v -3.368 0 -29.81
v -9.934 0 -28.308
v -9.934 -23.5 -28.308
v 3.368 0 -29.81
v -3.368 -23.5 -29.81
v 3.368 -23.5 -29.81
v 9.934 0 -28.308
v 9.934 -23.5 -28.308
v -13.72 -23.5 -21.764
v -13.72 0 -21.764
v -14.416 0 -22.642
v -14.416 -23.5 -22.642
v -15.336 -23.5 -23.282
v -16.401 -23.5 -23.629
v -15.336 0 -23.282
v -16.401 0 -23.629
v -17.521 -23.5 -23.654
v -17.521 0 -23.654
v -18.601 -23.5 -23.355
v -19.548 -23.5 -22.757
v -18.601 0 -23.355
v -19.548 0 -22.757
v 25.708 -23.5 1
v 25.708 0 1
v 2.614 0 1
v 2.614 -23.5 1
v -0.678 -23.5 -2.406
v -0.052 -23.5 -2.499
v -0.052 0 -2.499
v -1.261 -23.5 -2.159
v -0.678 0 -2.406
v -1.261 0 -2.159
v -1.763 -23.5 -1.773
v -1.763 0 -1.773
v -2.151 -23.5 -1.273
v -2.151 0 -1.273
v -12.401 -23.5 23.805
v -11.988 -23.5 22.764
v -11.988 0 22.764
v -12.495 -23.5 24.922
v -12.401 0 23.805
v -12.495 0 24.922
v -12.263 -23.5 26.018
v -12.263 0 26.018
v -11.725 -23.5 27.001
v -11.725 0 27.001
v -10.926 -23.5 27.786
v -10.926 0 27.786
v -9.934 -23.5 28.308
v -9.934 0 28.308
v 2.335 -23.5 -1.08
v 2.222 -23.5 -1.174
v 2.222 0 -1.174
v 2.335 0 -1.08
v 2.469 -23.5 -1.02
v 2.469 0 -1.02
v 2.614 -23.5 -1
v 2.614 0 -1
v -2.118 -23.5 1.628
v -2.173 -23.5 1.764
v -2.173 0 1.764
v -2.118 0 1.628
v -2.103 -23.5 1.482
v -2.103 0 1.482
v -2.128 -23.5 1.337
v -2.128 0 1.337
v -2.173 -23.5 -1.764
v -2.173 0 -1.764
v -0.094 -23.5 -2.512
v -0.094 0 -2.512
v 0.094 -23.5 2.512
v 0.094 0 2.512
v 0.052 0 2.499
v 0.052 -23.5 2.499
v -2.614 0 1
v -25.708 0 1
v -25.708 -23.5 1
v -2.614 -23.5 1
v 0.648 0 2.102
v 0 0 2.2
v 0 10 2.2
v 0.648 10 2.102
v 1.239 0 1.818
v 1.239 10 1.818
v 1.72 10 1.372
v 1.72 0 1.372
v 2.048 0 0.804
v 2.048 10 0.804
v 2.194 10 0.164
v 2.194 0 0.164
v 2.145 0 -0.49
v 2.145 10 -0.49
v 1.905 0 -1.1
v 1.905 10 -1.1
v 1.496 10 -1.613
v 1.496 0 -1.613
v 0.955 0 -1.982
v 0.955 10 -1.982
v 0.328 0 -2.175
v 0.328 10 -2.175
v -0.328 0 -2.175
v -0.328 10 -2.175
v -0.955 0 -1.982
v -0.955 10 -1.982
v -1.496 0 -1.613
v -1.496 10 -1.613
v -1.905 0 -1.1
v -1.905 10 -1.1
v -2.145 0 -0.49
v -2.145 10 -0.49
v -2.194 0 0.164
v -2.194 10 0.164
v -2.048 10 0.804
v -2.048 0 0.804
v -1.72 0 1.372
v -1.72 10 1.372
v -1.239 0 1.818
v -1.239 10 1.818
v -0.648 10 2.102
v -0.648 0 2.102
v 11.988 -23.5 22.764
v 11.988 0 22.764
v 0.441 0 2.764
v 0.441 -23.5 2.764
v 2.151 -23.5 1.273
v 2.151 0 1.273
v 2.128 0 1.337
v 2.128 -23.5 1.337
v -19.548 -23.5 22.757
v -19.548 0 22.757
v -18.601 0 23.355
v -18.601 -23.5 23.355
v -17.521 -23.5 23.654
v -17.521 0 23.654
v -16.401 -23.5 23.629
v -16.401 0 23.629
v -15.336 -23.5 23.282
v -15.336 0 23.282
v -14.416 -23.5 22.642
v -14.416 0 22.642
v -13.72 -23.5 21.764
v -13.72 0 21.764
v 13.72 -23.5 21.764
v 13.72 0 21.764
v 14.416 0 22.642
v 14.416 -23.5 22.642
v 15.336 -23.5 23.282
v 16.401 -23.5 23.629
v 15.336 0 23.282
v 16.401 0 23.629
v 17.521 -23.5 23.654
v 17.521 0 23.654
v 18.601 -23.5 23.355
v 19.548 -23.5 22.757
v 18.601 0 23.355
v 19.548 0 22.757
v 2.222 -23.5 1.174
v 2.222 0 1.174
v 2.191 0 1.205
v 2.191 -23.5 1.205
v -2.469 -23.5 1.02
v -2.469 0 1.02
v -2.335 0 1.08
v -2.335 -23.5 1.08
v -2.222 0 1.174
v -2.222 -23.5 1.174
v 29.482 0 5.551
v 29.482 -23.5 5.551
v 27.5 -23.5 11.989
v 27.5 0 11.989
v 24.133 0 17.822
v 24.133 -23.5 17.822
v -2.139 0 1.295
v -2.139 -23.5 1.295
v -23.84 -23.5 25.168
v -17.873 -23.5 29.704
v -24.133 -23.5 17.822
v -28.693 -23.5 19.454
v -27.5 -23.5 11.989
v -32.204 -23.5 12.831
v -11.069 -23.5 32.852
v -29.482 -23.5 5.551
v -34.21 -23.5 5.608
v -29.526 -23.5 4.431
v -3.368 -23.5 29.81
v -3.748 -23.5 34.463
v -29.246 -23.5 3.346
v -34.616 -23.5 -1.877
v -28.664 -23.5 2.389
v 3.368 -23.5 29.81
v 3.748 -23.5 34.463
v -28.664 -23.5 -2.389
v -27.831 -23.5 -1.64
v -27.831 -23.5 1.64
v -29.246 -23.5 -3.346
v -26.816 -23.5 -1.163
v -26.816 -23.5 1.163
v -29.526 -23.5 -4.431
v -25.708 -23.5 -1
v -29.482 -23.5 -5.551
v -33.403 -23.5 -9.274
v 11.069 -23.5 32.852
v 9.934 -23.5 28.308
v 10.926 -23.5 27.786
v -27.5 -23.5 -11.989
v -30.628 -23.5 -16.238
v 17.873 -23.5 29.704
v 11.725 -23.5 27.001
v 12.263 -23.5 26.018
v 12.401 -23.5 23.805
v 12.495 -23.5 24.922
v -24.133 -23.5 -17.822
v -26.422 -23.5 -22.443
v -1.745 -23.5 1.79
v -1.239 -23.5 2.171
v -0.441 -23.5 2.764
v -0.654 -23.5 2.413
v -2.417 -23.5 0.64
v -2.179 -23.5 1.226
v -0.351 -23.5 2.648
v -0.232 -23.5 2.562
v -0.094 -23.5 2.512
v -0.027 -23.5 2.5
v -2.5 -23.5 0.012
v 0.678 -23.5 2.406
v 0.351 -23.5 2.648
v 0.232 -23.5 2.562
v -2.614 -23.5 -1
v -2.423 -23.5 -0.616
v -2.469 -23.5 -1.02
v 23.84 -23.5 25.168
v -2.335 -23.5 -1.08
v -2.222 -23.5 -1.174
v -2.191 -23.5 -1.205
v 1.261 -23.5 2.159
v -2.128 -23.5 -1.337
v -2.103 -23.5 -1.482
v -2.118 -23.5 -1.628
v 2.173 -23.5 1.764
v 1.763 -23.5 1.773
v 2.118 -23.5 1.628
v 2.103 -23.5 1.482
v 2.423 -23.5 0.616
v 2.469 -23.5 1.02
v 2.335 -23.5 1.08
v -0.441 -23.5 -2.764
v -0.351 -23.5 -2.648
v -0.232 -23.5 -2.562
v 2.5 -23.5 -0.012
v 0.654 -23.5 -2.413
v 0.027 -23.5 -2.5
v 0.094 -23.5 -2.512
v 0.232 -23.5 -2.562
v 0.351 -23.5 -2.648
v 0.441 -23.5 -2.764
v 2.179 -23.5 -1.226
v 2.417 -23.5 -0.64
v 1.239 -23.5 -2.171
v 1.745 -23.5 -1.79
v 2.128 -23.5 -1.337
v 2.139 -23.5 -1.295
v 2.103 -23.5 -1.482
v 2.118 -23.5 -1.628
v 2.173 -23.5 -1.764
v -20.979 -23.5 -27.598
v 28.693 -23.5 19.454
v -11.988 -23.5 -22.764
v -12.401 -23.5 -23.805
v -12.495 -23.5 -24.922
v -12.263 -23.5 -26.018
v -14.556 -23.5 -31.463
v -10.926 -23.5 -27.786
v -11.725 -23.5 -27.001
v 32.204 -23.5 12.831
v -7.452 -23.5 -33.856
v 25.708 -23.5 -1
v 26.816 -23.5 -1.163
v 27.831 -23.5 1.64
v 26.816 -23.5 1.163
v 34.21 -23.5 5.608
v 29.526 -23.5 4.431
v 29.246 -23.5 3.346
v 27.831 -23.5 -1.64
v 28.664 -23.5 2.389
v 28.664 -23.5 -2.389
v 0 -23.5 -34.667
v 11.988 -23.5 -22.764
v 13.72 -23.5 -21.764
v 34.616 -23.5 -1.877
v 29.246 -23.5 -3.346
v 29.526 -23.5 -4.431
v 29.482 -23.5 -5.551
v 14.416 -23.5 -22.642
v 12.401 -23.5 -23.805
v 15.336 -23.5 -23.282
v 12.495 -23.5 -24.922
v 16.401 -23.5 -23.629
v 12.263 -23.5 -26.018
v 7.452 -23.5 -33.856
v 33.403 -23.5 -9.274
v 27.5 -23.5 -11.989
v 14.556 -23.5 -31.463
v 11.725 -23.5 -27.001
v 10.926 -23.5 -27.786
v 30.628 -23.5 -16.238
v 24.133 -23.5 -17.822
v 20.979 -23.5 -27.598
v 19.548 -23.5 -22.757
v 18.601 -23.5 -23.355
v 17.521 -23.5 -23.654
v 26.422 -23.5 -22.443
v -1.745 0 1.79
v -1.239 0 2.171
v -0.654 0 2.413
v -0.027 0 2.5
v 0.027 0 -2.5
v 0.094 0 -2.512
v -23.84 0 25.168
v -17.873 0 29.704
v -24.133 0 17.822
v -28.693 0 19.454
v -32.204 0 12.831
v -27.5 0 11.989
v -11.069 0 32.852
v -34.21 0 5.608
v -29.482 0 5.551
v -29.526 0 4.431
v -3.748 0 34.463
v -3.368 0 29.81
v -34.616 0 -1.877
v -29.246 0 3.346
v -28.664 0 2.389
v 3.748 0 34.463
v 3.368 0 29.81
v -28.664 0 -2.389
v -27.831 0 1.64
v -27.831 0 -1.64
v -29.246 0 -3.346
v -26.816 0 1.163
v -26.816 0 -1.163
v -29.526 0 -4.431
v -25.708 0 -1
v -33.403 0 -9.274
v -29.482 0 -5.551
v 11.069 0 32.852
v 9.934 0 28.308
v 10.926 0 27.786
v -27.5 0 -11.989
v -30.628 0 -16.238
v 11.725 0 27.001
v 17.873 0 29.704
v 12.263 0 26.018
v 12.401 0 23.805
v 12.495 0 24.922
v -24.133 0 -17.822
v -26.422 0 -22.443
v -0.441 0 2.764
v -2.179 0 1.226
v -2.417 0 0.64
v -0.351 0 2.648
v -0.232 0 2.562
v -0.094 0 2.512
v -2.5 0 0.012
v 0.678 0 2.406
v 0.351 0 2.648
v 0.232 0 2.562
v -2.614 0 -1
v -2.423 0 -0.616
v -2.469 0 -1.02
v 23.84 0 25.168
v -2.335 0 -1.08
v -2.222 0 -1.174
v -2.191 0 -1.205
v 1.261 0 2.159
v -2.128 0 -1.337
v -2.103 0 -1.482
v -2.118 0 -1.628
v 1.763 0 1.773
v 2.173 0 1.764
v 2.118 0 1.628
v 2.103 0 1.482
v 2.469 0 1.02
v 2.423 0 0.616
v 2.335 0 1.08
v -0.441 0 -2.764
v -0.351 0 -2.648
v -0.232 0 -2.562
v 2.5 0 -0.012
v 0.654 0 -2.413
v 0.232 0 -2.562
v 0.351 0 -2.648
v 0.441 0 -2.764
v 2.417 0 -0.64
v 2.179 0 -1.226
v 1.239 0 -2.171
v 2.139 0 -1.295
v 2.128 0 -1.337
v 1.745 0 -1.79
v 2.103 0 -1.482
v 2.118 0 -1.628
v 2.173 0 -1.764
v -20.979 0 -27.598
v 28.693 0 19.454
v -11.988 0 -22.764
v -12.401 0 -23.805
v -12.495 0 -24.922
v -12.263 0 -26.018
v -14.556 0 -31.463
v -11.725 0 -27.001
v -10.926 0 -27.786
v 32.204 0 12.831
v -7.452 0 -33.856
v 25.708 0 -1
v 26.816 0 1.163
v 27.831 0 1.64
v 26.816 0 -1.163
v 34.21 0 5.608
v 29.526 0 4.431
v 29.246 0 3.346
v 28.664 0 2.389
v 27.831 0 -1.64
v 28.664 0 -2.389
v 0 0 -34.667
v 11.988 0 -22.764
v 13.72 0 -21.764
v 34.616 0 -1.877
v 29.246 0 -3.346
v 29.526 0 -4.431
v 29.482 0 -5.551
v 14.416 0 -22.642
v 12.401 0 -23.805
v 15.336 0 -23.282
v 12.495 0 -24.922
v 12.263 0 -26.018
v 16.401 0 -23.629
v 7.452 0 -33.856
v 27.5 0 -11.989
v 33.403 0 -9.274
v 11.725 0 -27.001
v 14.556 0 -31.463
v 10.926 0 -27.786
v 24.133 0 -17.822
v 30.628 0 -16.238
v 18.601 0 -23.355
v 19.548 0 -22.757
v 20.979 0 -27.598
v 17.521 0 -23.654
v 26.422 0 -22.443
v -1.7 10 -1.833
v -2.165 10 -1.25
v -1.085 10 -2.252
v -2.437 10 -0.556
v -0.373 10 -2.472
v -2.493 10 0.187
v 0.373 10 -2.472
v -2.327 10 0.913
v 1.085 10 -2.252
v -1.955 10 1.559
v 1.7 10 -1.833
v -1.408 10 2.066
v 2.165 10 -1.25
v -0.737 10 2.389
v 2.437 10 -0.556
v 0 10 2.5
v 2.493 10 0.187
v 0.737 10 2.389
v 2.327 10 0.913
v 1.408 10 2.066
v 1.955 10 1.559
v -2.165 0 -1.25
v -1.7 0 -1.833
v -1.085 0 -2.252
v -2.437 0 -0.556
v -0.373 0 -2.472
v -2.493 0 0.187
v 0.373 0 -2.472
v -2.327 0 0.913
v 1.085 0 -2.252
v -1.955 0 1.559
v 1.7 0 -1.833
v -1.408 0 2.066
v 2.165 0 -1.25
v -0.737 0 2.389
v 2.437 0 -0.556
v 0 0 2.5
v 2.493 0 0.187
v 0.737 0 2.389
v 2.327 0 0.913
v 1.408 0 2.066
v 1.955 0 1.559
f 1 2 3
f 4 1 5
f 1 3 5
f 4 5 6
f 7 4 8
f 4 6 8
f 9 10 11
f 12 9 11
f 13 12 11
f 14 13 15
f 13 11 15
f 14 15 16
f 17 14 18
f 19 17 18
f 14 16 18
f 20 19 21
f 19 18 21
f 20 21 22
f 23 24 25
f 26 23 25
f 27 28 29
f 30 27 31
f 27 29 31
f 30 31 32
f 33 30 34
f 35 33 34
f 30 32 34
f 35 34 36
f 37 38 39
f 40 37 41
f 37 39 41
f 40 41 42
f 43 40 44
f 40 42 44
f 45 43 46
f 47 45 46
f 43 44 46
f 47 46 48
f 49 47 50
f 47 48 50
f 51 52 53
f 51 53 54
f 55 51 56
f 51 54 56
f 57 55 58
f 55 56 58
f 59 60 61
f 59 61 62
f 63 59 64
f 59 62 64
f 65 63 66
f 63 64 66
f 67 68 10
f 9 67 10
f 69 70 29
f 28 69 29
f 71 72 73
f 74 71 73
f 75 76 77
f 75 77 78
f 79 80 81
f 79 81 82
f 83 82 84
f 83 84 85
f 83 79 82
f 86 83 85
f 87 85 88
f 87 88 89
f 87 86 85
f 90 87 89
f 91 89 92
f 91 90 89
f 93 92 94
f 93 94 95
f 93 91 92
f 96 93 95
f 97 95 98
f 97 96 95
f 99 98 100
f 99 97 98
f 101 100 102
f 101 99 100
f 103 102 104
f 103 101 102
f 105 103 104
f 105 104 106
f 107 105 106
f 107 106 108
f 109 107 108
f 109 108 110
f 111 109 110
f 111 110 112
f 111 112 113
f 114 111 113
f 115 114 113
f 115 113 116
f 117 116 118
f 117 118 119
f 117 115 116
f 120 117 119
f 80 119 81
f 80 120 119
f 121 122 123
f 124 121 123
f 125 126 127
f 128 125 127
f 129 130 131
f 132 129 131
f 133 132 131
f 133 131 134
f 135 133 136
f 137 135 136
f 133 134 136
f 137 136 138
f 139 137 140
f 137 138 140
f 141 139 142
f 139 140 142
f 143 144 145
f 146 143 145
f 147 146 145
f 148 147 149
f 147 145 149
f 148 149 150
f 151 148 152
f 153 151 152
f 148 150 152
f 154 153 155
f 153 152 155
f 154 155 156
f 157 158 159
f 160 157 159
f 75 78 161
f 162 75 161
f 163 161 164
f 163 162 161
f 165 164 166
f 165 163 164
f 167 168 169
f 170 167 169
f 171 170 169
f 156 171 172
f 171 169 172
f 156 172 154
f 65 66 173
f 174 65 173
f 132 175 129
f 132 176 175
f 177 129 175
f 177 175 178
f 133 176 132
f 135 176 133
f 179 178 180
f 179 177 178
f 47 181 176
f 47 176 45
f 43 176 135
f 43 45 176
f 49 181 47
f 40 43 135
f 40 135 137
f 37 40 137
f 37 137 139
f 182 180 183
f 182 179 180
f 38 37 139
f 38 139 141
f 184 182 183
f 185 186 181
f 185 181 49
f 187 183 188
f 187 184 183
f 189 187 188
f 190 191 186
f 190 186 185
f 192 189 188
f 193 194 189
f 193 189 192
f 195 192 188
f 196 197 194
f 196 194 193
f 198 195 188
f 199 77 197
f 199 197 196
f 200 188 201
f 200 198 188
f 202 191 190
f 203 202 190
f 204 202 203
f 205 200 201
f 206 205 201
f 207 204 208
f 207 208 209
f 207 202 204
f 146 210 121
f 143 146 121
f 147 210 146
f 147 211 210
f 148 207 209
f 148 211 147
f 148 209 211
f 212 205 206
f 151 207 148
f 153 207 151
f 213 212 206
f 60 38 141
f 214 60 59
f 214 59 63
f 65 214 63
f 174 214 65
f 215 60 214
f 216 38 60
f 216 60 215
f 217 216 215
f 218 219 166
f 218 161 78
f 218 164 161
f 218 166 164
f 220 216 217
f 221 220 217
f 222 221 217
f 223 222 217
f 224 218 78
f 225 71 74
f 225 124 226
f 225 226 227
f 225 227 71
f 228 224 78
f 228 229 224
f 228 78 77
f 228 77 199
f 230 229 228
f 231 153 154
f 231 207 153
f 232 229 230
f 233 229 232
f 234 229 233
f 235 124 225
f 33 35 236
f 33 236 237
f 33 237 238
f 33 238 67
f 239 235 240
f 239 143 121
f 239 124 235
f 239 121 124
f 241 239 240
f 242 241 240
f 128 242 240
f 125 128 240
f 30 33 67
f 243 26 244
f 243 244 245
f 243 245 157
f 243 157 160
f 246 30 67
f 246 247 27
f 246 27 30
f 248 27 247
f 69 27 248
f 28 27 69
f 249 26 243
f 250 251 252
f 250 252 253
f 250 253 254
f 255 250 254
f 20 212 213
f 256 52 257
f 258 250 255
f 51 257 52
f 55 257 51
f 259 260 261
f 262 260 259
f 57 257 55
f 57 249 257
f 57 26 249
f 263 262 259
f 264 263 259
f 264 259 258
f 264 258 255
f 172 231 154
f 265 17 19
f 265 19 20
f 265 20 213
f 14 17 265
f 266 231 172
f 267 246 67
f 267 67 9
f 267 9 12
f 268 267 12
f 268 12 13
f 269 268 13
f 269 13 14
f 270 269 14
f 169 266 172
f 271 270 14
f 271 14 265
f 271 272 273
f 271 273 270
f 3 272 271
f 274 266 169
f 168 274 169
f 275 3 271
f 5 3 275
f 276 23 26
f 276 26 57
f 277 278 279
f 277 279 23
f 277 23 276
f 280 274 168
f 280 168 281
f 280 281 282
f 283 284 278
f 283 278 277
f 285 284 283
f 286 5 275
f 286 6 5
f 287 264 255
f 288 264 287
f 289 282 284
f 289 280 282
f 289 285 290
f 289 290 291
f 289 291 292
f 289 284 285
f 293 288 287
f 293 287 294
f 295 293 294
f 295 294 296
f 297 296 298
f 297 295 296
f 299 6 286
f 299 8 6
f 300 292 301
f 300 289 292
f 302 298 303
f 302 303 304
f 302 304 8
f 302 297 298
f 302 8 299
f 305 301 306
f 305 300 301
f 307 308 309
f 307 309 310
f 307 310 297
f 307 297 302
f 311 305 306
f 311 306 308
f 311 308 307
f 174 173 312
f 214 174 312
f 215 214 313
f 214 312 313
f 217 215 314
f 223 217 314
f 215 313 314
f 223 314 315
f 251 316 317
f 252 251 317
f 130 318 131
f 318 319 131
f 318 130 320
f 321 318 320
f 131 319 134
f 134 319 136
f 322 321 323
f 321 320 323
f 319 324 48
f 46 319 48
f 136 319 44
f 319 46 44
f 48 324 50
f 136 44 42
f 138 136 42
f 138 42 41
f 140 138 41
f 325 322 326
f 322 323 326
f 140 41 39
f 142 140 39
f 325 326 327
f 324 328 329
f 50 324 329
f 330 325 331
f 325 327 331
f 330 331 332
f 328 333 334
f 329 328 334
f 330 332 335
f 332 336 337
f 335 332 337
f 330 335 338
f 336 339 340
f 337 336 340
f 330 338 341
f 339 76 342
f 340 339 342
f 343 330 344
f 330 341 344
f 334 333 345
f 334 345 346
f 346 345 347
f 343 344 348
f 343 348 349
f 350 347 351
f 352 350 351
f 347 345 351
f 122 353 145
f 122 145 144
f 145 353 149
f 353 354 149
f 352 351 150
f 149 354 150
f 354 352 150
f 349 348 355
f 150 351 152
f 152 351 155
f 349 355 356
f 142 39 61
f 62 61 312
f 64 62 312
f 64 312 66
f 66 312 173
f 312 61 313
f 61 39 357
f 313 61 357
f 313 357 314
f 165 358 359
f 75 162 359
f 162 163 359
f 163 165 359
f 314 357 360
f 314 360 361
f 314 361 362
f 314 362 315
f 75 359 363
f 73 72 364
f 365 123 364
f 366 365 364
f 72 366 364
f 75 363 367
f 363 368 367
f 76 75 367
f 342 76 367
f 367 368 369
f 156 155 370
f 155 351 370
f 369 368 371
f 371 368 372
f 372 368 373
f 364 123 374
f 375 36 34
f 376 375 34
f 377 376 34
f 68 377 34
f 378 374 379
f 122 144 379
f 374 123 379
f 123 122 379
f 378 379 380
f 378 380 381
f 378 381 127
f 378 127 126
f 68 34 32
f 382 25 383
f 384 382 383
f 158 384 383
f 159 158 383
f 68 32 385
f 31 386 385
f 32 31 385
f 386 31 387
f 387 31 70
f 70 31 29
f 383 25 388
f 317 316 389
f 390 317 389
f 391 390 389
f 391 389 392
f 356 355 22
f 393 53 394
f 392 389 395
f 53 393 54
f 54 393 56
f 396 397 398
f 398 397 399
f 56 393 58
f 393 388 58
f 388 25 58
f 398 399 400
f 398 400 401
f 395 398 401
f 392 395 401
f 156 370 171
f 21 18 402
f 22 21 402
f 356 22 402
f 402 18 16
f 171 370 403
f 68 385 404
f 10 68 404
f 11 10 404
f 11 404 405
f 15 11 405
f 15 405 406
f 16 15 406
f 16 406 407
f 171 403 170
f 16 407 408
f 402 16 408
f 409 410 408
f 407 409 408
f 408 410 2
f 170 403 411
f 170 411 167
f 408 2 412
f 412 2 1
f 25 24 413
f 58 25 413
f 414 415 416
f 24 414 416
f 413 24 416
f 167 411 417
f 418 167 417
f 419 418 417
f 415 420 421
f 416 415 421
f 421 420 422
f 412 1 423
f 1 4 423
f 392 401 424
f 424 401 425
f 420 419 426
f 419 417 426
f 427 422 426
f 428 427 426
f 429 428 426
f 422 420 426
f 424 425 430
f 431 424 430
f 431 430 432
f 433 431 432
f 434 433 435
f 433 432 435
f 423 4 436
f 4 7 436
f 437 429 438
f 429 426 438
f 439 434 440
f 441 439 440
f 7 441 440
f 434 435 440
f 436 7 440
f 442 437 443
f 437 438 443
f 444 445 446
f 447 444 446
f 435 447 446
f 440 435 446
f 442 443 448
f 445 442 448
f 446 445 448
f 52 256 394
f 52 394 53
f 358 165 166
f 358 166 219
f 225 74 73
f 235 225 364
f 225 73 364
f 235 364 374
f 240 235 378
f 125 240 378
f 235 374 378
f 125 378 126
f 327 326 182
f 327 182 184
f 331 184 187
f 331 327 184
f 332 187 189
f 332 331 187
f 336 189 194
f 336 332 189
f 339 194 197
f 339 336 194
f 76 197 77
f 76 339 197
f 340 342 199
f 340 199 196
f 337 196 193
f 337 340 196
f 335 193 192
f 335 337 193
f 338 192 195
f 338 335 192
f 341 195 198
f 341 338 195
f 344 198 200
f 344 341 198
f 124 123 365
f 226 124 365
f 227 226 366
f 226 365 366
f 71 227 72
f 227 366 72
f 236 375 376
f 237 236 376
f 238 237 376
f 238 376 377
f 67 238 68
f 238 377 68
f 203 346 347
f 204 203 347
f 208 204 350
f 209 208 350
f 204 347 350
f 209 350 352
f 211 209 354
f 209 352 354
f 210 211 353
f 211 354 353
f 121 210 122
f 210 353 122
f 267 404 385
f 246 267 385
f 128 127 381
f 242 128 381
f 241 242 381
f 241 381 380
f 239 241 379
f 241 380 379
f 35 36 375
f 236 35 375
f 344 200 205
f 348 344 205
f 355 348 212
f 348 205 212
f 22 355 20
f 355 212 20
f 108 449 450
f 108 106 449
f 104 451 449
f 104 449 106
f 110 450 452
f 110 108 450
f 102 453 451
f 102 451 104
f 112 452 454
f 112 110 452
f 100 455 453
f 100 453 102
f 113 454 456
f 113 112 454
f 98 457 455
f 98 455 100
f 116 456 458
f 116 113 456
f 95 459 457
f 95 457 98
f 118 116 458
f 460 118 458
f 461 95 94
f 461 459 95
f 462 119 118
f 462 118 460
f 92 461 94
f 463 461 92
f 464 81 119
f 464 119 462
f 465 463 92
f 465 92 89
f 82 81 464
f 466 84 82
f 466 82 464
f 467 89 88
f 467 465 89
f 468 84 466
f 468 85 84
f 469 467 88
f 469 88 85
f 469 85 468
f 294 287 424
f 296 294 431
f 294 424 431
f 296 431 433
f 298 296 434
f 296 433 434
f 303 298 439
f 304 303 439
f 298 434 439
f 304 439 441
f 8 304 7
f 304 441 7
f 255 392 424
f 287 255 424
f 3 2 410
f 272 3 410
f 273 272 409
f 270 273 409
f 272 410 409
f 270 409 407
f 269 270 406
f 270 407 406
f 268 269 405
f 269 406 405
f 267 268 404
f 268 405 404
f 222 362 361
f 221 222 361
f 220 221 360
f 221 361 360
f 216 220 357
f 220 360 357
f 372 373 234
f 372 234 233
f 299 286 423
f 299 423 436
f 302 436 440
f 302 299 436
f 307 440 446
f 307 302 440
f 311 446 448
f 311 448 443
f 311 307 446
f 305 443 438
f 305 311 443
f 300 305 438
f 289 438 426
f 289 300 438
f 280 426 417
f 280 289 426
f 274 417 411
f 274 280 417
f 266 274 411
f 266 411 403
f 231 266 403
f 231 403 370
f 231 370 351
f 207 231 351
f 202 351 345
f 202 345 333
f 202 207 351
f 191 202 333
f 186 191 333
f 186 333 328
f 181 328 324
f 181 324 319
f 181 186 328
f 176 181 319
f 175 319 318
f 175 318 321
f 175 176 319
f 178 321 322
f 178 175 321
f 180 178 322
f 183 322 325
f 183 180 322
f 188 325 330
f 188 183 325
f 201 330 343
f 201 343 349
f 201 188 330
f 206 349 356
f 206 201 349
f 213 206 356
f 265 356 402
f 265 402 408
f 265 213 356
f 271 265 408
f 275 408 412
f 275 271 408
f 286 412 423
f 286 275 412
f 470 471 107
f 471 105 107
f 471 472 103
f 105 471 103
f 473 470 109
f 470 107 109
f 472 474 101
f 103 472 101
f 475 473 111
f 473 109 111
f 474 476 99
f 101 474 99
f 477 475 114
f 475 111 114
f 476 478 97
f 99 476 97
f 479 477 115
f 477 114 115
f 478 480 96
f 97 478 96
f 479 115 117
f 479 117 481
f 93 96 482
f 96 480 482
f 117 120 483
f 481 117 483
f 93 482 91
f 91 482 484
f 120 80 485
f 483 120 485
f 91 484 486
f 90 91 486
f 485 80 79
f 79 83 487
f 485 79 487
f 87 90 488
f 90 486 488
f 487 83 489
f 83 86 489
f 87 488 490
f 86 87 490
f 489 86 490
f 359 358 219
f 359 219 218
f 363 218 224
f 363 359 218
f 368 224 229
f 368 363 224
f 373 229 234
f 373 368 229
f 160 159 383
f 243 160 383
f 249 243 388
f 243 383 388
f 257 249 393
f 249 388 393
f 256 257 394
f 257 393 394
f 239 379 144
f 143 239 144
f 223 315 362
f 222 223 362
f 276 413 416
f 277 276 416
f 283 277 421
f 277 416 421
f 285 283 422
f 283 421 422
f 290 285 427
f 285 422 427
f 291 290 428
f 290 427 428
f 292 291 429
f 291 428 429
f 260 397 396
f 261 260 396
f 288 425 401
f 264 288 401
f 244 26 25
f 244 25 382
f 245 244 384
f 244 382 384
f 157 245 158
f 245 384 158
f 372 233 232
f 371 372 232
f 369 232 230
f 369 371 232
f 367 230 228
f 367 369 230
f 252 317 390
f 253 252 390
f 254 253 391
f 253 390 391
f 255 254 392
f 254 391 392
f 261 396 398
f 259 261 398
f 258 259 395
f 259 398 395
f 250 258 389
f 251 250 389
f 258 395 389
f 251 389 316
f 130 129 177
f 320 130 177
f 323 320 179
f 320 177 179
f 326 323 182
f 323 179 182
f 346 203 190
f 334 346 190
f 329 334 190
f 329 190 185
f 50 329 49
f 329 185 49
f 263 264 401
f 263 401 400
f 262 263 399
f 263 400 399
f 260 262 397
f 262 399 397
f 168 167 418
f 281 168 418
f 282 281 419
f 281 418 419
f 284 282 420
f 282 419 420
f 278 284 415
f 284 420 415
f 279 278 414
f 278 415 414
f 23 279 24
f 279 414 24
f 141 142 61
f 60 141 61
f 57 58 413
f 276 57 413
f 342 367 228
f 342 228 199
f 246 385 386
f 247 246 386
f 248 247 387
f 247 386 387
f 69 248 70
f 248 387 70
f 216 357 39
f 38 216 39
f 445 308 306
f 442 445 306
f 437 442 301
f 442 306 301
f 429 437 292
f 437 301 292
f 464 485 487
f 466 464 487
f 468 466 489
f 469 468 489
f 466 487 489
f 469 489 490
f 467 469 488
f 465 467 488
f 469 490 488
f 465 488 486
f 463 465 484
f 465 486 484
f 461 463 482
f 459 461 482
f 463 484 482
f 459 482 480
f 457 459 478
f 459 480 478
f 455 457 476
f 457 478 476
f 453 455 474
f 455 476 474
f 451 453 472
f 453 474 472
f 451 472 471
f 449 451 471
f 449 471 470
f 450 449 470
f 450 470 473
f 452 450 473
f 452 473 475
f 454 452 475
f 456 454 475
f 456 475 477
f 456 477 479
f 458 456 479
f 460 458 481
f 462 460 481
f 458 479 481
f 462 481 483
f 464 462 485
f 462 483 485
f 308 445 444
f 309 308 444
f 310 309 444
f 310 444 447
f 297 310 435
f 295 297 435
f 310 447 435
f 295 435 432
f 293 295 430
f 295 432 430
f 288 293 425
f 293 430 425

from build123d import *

# Parameters (mm, degrees)
SKETCH1_R             = 2.5
SKETCH1_R_2           = 2.2
BOSS_EXTRUDE1_DEPTH   = 10
BOSS_EXTRUDE3_DEPTH   = 23.5
BOSS_EXTRUDE3_2_DEPTH = 23.5
BOSS_EXTRUDE3_3_DEPTH = 23.5
BOSS_EXTRUDE3_4_DEPTH = 23.5
BOSS_EXTRUDE3_5_DEPTH = 23.5
BOSS_EXTRUDE3_6_DEPTH = 23.5
SKETCH5_R             = 34.666608733
SKETCH5_R_2           = 30
BOSS_EXTRUDE4_DEPTH   = 23.5
SKETCH6_R             = 1.5
BOSS_EXTRUDE5_DEPTH   = 10
SKETCH8_R             = 1.5
CUT_EXTRUDE2_DEPTH    = 10


with BuildPart() as part:
    # Sketch1 → Boss-Extrude1 (new body)
    with BuildSketch(Plane(origin=(0, 0, 0), x_dir=(1, 0, 0), z_dir=(0, 1, 0))):
        with Locations(Location((0, 0, 0), (0, 0, 270))):
            Circle(SKETCH1_R)
        with Locations(Location((0, 0, 0), (0, 0, 270))):
            Circle(SKETCH1_R_2, mode=Mode.SUBTRACT)
    extrude(amount=BOSS_EXTRUDE1_DEPTH)


with BuildPart() as body_2:
    # Sketch2 → Boss-Extrude3 (new body)
    with BuildSketch(Plane(origin=(0, 0, 0), x_dir=(-1, 0, 0), z_dir=(0, -1, 0))):
        with BuildLine():
            Line((2.61395079, 1), (25.707973339, 1))
            ThreePointArc((25.707973339, 1), (28.664062792, 2.388870469), (29.481986287, 5.550899437))
            ThreePointArc((29.481986287, 5.550899437), (30, 0), (29.481986287, -5.550899437))
            ThreePointArc((29.481986287, -5.550899437), (28.664062792, -2.388870469), (25.707973339, -1))
            Line((25.707973339, -1), (2.61395079, -1))
            ThreePointArc((2.61395079, -1), (2.399550586, -1.045528996), (2.222154945, -1.174257873))
            Line((2.222154945, -1.174257873), (2.178514499, -1.226407182))
            ThreePointArc((2.178514499, -1.226407182), (2.499969191, -0.012411485), (2.190584188, 1.204716114))
            Line((2.190584188, 1.204716114), (2.222154945, 1.174257873))
            ThreePointArc((2.222154945, 1.174257873), (2.399550586, 1.045528996), (2.61395079, 1))
        make_face()
    extrude(amount=BOSS_EXTRUDE3_DEPTH)



with BuildPart() as body_3:
    # Sketch2 → Boss-Extrude3 2 (new body)
    with BuildSketch(Plane(origin=(0, 0, 0), x_dir=(-1, 0, 0), z_dir=(0, -1, 0))):
        with BuildLine():
            Line((0.440949991, -2.763747789), (11.987961266, -22.763757991))
            ThreePointArc((11.987961266, -22.763757991), (12.263208883, -26.018241788), (9.933773217, -28.307598797))
            ThreePointArc((9.933773217, -28.307598797), (15, -25.980762114), (19.54821307, -22.75669936))
            ThreePointArc((19.54821307, -22.75669936), (16.400853909, -23.629371319), (13.720012073, -21.763757991))
            Line((13.720012073, -21.763757991), (2.173000799, -1.763747789))
            ThreePointArc((2.173000799, -1.763747789), (2.105229964, -1.555307267), (2.128014621, -1.337313697))
            Line((2.128014621, -1.337313697), (2.138606853, -1.294743499))
            ThreePointArc((2.138606853, -1.294743499), (1.239235934, -2.17124257), (0.027157474, -2.49985249))
            Line((0.027157474, -2.49985249), (0.094140324, -2.511571571))
            ThreePointArc((0.094140324, -2.511571571), (0.294320622, -2.600836263), (0.440949991, -2.763747789))
        make_face()
    extrude(amount=BOSS_EXTRUDE3_2_DEPTH)


with BuildPart() as body_4:
    # Sketch2 → Boss-Extrude3 3 (new body)
    with BuildSketch(Plane(origin=(0, 0, 0), x_dir=(-1, 0, 0), z_dir=(0, -1, 0))):
        with BuildLine():
            Line((-2.173000799, -1.763747789), (-13.720012073, -21.763757991))
            ThreePointArc((-13.720012073, -21.763757991), (-16.400853909, -23.629371319), (-19.54821307, -22.75669936))
            ThreePointArc((-19.54821307, -22.75669936), (-15, -25.980762114), (-9.933773217, -28.307598797))
            ThreePointArc((-9.933773217, -28.307598797), (-12.263208883, -26.018241788), (-11.987961266, -22.763757991))
            Line((-11.987961266, -22.763757991), (-0.440949991, -2.763747789))
            ThreePointArc((-0.440949991, -2.763747789), (-0.294320622, -2.600836263), (-0.094140324, -2.511571571))
            Line((-0.094140324, -2.511571571), (-0.051977335, -2.499459613))
            ThreePointArc((-0.051977335, -2.499459613), (-1.260733257, -2.158831086), (-2.151357025, -1.273445308))
            Line((-2.151357025, -1.273445308), (-2.128014621, -1.337313697))
            ThreePointArc((-2.128014621, -1.337313697), (-2.105229964, -1.555307267), (-2.173000799, -1.763747789))
        make_face()
    extrude(amount=BOSS_EXTRUDE3_3_DEPTH)


with BuildPart() as body_5:
    # Sketch2 → Boss-Extrude3 4 (new body)
    with BuildSketch(Plane(origin=(0, 0, 0), x_dir=(-1, 0, 0), z_dir=(0, -1, 0))):
        with BuildLine():
            Line((-2.61395079, 1), (-25.707973339, 1))
            ThreePointArc((-25.707973339, 1), (-28.664062792, 2.388870469), (-29.481986287, 5.550899437))
            ThreePointArc((-29.481986287, 5.550899437), (-30, 0), (-29.481986287, -5.550899437))
            ThreePointArc((-29.481986287, -5.550899437), (-28.664062792, -2.388870469), (-25.707973339, -1))
            Line((-25.707973339, -1), (-2.61395079, -1))
            ThreePointArc((-2.61395079, -1), (-2.399550586, -1.045528996), (-2.222154945, -1.174257873))
            Line((-2.222154945, -1.174257873), (-2.190584188, -1.204716114))
            ThreePointArc((-2.190584188, -1.204716114), (-2.499969191, 0.012411485), (-2.178514499, 1.226407182))
            Line((-2.178514499, 1.226407182), (-2.222154945, 1.174257873))
            ThreePointArc((-2.222154945, 1.174257873), (-2.399550586, 1.045528996), (-2.61395079, 1))
        make_face()
    extrude(amount=BOSS_EXTRUDE3_4_DEPTH)


with BuildPart() as body_6:
    # Sketch2 → Boss-Extrude3 5 (new body)
    with BuildSketch(Plane(origin=(0, 0, 0), x_dir=(-1, 0, 0), z_dir=(0, -1, 0))):
        with BuildLine():
            Line((-0.440949991, 2.763747789), (-11.987961266, 22.763757991))
            ThreePointArc((-11.987961266, 22.763757991), (-12.263208883, 26.018241788), (-9.933773217, 28.307598797))
            ThreePointArc((-9.933773217, 28.307598797), (-15, 25.980762114), (-19.54821307, 22.75669936))
            ThreePointArc((-19.54821307, 22.75669936), (-16.400853909, 23.629371319), (-13.720012073, 21.763757991))
            Line((-13.720012073, 21.763757991), (-2.173000799, 1.763747789))
            ThreePointArc((-2.173000799, 1.763747789), (-2.105229964, 1.555307267), (-2.128014621, 1.337313697))
            Line((-2.128014621, 1.337313697), (-2.138606853, 1.294743499))
            ThreePointArc((-2.138606853, 1.294743499), (-1.239235934, 2.17124257), (-0.027157474, 2.49985249))
            Line((-0.027157474, 2.49985249), (-0.094140324, 2.511571571))
            ThreePointArc((-0.094140324, 2.511571571), (-0.294320622, 2.600836263), (-0.440949991, 2.763747789))
        make_face()
    extrude(amount=BOSS_EXTRUDE3_5_DEPTH)


with BuildPart() as body_7:
    # Sketch2 → Boss-Extrude3 6 (new body)
    with BuildSketch(Plane(origin=(0, 0, 0), x_dir=(-1, 0, 0), z_dir=(0, -1, 0))):
        with BuildLine():
            Line((2.173000799, 1.763747789), (13.720012073, 21.763757991))
            ThreePointArc((13.720012073, 21.763757991), (16.400853909, 23.629371319), (19.54821307, 22.75669936))
            ThreePointArc((19.54821307, 22.75669936), (15, 25.980762114), (9.933773217, 28.307598797))
            ThreePointArc((9.933773217, 28.307598797), (12.263208883, 26.018241788), (11.987961266, 22.763757991))
            Line((11.987961266, 22.763757991), (0.440949991, 2.763747789))
            ThreePointArc((0.440949991, 2.763747789), (0.294320622, 2.600836263), (0.094140324, 2.511571571))
            Line((0.094140324, 2.511571571), (0.051977335, 2.499459613))
            ThreePointArc((0.051977335, 2.499459613), (1.260733257, 2.158831086), (2.151357025, 1.273445308))
            Line((2.151357025, 1.273445308), (2.128014621, 1.337313697))
            ThreePointArc((2.128014621, 1.337313697), (2.105229964, 1.555307267), (2.173000799, 1.763747789))
        make_face()
    extrude(amount=BOSS_EXTRUDE3_6_DEPTH)


with BuildPart() as body_2_1:
    add(body_2.part)

    add(body_3.part)  # Boss-Extrude4 merges body 3

    add(body_4.part)  # Boss-Extrude4 merges body 4

    add(body_5.part)  # Boss-Extrude4 merges body 5

    add(body_6.part)  # Boss-Extrude4 merges body 6

    add(body_7.part)  # Boss-Extrude4 merges body 7
    # Sketch5 → Boss-Extrude4 (add)
    with BuildSketch(Plane(origin=(0, -23.5, 0), x_dir=(-1, 0, 0), z_dir=(0, -1, 0))):
        with Locations(Location((0, 0, 0), (0, 0, 90))):
            Circle(SKETCH5_R)
        Circle(SKETCH5_R_2, mode=Mode.SUBTRACT)
    extrude(amount=-BOSS_EXTRUDE4_DEPTH)


with BuildPart() as body_3_2:
    # Sketch6 → Boss-Extrude5 (new body)
    with BuildSketch(Plane(origin=(0, 10, 0), x_dir=(1, 0, 0), z_dir=(0, 1, 0))):
        with Locations(Location((0, 0, 0), (0, 0, 270))):
            Circle(SKETCH6_R)
    extrude(amount=-BOSS_EXTRUDE5_DEPTH)

    # Sketch8 → Cut-Extrude2 (cut)
    with BuildSketch(Plane(origin=(0, 10, 0), x_dir=(1, 0, 0), z_dir=(0, 1, 0))):
        Circle(SKETCH8_R)
    extrude(amount=-CUT_EXTRUDE2_DEPTH, mode=Mode.SUBTRACT)


solid = Compound([part.part, body_2_1.part])
